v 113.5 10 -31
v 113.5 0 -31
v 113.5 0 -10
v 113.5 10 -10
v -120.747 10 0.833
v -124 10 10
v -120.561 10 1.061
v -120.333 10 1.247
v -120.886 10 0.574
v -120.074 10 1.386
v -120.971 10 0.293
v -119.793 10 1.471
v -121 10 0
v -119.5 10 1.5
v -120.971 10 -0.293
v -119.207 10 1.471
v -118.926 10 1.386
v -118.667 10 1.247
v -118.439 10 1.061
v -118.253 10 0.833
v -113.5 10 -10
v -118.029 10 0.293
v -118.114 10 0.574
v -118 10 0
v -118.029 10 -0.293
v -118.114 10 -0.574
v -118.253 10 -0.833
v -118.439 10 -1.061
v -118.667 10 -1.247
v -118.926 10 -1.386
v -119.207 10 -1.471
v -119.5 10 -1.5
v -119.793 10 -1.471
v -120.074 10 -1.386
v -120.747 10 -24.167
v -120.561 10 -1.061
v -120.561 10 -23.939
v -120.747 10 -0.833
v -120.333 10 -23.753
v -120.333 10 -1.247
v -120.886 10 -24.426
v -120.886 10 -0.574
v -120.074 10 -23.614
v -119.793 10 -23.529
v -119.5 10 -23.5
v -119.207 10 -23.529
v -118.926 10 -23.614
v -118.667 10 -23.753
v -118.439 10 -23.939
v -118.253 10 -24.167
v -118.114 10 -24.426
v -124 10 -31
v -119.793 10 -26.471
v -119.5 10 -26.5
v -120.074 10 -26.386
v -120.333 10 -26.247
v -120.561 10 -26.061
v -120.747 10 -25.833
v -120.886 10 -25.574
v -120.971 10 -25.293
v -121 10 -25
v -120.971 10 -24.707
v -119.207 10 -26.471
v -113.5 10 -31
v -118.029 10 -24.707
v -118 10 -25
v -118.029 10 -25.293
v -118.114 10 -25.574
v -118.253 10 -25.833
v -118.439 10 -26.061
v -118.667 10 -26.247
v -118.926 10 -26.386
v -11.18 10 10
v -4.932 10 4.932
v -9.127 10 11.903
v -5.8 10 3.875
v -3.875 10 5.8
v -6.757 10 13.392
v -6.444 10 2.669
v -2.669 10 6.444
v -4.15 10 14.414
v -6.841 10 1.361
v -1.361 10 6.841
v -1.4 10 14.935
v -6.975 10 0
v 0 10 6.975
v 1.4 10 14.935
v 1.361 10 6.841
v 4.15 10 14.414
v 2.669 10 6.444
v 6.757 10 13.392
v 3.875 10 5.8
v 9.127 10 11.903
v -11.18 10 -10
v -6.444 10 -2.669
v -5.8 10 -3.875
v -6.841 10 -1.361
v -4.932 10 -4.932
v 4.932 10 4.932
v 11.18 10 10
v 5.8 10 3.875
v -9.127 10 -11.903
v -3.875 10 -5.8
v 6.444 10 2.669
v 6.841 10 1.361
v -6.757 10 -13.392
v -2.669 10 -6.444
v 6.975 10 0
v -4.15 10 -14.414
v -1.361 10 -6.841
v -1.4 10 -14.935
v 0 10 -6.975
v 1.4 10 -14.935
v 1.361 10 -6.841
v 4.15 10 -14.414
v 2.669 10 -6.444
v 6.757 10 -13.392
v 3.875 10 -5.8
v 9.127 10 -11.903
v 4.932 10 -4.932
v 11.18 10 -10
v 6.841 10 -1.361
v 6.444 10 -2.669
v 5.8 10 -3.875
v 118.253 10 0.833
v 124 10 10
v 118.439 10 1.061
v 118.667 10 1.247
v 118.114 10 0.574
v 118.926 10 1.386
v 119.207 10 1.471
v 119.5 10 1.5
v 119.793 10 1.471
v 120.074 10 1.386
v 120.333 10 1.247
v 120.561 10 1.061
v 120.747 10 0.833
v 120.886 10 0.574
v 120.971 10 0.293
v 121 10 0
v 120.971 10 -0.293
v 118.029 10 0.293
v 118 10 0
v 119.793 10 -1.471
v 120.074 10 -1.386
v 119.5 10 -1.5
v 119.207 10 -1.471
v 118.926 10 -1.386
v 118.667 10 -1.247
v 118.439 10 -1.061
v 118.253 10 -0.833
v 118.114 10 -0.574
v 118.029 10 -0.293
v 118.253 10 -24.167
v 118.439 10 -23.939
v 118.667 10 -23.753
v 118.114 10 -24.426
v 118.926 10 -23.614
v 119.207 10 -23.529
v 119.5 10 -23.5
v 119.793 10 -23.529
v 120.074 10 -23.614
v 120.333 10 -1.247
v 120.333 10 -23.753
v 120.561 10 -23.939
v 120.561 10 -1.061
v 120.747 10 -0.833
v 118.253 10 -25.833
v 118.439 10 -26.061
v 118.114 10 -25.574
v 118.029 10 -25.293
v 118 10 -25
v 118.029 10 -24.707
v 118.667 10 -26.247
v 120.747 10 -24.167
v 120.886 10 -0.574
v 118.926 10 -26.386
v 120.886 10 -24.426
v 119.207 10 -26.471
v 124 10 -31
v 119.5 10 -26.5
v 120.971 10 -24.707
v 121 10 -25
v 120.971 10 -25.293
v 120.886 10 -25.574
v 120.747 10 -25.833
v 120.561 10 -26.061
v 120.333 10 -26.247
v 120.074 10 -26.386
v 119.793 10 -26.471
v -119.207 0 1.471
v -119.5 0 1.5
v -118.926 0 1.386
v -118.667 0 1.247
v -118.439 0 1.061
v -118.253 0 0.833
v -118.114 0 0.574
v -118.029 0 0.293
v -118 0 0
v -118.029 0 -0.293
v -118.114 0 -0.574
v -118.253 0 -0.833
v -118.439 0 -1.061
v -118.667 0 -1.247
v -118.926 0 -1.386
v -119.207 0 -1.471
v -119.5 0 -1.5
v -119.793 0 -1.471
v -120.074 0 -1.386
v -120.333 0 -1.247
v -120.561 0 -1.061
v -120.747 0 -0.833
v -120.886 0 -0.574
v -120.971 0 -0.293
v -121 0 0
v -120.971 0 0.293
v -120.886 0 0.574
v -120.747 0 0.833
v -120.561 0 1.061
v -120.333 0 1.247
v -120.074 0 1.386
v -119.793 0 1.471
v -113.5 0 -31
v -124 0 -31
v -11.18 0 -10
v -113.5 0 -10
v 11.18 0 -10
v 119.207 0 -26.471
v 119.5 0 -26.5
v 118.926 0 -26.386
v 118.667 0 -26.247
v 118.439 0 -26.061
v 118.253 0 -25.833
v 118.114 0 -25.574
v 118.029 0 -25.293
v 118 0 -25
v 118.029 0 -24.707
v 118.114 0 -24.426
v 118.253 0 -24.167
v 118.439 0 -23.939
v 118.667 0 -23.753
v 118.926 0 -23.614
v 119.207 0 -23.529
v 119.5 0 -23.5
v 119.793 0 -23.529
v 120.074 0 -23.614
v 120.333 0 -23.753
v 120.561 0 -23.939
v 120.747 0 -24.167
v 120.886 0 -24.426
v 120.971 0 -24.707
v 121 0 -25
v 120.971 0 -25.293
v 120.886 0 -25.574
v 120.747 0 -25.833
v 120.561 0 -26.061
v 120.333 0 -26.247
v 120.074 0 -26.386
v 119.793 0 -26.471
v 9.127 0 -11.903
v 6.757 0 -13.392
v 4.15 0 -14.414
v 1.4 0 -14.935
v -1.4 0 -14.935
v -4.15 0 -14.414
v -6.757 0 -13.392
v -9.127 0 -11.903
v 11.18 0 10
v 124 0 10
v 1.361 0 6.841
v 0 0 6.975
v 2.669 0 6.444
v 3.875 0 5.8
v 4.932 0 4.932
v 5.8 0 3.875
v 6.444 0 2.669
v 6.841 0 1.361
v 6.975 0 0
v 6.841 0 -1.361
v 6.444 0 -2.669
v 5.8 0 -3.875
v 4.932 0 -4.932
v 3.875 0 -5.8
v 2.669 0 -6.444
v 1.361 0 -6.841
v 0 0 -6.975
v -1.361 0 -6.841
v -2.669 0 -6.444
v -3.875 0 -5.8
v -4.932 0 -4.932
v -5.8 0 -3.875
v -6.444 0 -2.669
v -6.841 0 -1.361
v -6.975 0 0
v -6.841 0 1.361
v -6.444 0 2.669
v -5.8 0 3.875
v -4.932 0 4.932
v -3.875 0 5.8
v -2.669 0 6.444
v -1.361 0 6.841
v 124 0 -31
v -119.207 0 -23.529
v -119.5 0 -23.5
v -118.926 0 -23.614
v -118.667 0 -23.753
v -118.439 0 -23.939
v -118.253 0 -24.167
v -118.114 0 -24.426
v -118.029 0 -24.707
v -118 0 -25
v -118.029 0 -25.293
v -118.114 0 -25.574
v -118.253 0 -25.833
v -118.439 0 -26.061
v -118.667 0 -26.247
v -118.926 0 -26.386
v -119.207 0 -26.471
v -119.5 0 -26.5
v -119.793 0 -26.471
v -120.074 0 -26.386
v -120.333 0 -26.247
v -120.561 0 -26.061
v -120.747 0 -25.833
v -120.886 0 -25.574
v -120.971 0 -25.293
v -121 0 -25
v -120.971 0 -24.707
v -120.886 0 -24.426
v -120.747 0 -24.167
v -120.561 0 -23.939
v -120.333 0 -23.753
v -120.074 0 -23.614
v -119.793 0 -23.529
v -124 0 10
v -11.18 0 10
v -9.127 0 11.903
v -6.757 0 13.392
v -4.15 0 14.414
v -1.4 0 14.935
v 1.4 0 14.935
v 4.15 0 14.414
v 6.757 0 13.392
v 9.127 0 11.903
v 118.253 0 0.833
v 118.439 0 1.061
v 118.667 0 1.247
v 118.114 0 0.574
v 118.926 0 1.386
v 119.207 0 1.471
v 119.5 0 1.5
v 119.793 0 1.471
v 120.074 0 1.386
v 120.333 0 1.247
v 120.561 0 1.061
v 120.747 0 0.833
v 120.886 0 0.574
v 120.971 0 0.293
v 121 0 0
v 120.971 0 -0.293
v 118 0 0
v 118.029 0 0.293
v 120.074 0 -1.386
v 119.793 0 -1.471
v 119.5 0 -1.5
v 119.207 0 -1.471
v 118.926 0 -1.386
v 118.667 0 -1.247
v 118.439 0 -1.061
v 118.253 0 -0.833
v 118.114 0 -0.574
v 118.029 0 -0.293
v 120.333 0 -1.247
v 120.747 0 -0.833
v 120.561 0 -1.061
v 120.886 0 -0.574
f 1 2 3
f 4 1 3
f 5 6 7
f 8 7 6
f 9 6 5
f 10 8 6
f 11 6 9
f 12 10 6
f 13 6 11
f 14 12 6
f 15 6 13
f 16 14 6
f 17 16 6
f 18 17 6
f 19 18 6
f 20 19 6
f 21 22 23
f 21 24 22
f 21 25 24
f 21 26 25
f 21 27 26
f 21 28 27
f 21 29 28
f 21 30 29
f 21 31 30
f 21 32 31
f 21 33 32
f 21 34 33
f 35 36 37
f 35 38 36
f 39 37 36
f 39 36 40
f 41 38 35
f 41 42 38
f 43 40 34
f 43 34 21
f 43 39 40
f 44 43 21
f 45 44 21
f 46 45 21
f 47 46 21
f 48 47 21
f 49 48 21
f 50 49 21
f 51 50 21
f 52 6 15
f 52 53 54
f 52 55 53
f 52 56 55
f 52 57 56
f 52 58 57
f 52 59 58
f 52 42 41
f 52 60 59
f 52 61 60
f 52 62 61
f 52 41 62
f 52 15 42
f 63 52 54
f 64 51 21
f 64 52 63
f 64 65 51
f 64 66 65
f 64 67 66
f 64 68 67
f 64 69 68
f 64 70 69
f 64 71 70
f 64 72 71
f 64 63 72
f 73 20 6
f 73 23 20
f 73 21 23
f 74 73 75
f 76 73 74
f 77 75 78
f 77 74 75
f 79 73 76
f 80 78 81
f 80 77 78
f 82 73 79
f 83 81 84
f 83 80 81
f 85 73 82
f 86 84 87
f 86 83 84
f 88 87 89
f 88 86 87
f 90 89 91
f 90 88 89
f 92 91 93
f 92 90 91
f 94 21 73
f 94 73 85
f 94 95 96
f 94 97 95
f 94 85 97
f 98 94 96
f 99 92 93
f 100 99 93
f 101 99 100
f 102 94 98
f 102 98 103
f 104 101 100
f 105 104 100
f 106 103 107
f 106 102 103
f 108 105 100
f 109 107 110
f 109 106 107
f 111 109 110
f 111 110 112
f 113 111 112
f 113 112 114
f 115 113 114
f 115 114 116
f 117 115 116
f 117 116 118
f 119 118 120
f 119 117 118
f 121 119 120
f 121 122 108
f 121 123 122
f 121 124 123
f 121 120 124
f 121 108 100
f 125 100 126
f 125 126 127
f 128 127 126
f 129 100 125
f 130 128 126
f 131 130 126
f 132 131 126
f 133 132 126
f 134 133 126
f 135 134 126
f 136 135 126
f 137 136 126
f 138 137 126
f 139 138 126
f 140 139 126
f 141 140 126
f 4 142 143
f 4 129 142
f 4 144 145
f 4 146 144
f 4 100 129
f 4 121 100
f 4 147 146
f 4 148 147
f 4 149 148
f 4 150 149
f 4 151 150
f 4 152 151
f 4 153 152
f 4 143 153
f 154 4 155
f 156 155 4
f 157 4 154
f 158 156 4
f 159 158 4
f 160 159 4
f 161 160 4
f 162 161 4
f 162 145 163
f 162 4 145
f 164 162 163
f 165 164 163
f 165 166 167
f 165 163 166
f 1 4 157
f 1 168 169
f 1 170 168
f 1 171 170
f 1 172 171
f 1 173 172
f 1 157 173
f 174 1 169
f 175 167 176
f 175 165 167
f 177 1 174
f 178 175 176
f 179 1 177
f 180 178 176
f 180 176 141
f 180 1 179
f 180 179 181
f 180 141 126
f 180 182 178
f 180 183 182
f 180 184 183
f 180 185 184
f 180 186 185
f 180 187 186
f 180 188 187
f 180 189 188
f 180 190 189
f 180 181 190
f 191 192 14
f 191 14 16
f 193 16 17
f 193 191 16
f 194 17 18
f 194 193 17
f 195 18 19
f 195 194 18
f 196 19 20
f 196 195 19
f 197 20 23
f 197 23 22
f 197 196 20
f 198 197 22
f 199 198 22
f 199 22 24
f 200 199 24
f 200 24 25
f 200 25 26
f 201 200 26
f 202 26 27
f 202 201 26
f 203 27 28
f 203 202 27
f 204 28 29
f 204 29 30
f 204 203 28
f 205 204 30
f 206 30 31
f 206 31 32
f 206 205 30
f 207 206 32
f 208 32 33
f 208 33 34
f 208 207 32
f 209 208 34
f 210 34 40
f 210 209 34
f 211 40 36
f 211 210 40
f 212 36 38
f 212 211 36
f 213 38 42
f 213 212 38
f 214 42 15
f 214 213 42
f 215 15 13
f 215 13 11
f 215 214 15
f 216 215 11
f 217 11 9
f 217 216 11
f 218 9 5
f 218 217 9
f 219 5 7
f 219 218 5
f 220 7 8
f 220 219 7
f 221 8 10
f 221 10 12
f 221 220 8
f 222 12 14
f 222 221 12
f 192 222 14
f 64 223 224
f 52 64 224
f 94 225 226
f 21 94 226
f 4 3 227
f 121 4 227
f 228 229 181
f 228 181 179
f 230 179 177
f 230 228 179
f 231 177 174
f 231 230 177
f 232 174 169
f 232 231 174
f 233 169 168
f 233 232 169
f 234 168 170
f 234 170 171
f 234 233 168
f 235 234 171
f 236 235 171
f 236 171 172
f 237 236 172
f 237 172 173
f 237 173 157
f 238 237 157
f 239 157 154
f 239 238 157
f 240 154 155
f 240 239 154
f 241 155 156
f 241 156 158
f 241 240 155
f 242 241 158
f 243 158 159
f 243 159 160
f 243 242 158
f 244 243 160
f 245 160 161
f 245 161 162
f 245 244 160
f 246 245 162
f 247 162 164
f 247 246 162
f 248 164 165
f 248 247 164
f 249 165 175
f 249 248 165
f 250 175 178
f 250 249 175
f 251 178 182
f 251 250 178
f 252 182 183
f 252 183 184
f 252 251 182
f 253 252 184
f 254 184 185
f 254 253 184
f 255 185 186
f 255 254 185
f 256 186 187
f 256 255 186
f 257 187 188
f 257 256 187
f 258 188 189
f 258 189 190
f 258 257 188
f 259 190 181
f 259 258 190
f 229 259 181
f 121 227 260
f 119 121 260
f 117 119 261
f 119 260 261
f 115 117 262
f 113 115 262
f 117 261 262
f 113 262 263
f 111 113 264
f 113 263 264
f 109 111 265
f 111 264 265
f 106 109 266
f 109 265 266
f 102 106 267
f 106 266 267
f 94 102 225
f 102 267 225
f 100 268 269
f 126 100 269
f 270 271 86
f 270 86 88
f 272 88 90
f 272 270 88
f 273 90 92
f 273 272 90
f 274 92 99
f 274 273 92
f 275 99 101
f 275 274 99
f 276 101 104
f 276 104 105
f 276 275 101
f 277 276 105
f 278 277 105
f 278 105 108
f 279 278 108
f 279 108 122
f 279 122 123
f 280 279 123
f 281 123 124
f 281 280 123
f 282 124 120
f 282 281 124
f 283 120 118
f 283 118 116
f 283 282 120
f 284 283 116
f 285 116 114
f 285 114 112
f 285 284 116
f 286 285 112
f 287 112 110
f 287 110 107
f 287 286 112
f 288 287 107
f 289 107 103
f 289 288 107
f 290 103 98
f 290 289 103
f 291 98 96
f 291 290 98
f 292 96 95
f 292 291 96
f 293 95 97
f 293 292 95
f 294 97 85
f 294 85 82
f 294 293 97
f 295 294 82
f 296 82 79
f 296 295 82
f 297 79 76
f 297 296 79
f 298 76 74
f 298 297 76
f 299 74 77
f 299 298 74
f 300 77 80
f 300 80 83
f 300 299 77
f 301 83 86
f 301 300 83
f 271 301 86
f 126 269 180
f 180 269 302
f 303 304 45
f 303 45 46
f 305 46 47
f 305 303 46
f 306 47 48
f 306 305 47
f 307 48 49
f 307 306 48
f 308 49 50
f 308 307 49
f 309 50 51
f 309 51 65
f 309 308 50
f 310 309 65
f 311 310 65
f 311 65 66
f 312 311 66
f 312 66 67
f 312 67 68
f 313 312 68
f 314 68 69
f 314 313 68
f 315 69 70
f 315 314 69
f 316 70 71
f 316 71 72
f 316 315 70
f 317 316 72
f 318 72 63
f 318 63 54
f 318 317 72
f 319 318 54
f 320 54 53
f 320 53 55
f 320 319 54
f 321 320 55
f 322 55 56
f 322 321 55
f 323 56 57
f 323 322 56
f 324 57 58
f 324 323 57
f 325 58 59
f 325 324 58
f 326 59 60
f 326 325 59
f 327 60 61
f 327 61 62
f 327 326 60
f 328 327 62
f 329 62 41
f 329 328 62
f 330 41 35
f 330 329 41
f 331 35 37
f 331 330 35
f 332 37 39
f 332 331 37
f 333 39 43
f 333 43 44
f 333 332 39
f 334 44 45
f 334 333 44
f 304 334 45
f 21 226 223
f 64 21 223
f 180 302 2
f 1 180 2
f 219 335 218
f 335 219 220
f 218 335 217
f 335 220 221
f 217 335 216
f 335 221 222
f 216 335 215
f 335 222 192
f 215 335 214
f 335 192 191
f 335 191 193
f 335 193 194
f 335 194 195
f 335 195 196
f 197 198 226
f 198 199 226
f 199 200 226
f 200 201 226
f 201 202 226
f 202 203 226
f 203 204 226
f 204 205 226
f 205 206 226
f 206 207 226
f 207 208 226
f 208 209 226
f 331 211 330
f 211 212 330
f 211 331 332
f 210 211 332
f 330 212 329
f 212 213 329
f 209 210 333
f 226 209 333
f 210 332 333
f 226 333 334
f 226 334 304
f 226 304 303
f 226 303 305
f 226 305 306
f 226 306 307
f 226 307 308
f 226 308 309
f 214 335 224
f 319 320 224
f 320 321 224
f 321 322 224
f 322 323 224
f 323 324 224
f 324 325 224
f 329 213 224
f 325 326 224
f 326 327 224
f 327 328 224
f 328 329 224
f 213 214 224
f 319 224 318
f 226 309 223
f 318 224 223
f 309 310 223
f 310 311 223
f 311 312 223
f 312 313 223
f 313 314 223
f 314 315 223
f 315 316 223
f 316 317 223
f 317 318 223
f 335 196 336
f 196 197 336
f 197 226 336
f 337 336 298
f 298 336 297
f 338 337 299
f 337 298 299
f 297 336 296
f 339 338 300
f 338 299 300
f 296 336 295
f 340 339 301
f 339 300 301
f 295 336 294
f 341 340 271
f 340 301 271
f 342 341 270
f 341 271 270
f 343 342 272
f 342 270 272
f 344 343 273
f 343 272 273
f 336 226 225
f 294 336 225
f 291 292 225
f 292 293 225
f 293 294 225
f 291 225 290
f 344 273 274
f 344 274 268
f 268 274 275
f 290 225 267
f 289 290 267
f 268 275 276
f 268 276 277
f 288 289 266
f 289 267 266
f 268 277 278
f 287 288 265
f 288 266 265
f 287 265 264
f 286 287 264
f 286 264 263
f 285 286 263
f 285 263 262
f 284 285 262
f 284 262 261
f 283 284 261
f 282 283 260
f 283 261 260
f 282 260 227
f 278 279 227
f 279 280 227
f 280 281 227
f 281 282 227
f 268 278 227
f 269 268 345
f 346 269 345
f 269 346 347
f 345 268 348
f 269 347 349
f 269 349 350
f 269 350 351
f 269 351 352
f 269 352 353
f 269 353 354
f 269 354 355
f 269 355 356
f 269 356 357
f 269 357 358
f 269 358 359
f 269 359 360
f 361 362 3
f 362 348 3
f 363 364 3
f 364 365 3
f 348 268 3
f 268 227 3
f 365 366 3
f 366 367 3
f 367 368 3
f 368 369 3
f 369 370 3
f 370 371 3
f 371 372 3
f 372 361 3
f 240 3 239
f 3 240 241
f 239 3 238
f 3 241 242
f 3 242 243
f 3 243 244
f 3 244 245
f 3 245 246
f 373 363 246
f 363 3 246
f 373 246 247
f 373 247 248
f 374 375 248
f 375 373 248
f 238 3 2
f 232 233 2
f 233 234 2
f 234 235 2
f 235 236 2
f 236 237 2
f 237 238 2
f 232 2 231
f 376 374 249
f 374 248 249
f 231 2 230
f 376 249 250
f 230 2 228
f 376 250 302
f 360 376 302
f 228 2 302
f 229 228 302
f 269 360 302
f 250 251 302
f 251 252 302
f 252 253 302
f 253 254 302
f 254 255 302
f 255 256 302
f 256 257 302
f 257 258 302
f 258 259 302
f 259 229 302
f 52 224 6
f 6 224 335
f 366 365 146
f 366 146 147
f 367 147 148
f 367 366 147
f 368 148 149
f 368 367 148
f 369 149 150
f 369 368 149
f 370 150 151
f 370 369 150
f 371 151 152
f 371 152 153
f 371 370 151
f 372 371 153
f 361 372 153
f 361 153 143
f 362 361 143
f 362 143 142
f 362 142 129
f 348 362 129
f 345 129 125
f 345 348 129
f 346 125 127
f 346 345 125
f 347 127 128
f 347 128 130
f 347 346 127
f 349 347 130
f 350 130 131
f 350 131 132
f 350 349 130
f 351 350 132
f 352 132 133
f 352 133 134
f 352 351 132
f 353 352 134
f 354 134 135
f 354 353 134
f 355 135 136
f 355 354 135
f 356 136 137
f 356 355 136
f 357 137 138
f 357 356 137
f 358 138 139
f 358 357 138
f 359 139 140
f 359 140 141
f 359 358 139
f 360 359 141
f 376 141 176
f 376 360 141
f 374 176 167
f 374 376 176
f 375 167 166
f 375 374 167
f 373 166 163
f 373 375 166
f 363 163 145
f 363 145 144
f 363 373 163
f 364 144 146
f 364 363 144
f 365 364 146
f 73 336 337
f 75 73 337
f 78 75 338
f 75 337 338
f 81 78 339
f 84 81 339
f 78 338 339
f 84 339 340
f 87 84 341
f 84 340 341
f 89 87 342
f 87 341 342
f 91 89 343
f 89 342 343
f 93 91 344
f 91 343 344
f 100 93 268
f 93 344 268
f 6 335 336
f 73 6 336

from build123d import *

# Parameters (mm, degrees)
SKETCH1_R           = 1.5
SKETCH1_R_2         = 6.975
BOSS_EXTRUDE1_DEPTH = 10


with BuildPart() as part:
    # Sketch1 → Boss-Extrude1 (new body)
    with BuildSketch(Plane(origin=(0, 0, 0), x_dir=(1, 0, 0), z_dir=(0, 1, 0))):
        with BuildLine():
            Line((-124, -10), (-11.180339887, -10))
            ThreePointArc((-11.180339887, -10), (0, -15), (11.180339887, -10))
            Line((11.180339887, -10), (124, -10))
            Line((124, -10), (124, 10))
            Line((124, 10), (124, 31))
            Line((124, 31), (113.5, 31))
            Line((113.5, 31), (113.5, 10))
            Line((113.5, 10), (11.180339887, 10))
            ThreePointArc((11.180339887, 10), (0, 15), (-11.180339887, 10))
            Line((-11.180339887, 10), (-113.5, 10))
            Line((-113.5, 10), (-113.5, 31))
            Line((-113.5, 31), (-124, 31))
            Line((-124, 31), (-124, 10))
            Line((-124, 10), (-124, -10))
        make_face()
        with Locations(Location((-119.5, 0, 0), (0, 0, 270))):
            Circle(SKETCH1_R, mode=Mode.SUBTRACT)
        with Locations(Location((119.5, 0, 0), (0, 0, 90))):
            Circle(SKETCH1_R, mode=Mode.SUBTRACT)
        with Locations(Location((0, 0, 0), (0, 0, 270))):
            Circle(SKETCH1_R_2, mode=Mode.SUBTRACT)
        with Locations(Location((-119.5, 25, 0), (0, 0, 270))):
            Circle(SKETCH1_R, mode=Mode.SUBTRACT)
        with Locations(Location((119.5, 25, 0), (0, 0, 90))):
            Circle(SKETCH1_R, mode=Mode.SUBTRACT)
    extrude(amount=BOSS_EXTRUDE1_DEPTH)


solid = part.part
